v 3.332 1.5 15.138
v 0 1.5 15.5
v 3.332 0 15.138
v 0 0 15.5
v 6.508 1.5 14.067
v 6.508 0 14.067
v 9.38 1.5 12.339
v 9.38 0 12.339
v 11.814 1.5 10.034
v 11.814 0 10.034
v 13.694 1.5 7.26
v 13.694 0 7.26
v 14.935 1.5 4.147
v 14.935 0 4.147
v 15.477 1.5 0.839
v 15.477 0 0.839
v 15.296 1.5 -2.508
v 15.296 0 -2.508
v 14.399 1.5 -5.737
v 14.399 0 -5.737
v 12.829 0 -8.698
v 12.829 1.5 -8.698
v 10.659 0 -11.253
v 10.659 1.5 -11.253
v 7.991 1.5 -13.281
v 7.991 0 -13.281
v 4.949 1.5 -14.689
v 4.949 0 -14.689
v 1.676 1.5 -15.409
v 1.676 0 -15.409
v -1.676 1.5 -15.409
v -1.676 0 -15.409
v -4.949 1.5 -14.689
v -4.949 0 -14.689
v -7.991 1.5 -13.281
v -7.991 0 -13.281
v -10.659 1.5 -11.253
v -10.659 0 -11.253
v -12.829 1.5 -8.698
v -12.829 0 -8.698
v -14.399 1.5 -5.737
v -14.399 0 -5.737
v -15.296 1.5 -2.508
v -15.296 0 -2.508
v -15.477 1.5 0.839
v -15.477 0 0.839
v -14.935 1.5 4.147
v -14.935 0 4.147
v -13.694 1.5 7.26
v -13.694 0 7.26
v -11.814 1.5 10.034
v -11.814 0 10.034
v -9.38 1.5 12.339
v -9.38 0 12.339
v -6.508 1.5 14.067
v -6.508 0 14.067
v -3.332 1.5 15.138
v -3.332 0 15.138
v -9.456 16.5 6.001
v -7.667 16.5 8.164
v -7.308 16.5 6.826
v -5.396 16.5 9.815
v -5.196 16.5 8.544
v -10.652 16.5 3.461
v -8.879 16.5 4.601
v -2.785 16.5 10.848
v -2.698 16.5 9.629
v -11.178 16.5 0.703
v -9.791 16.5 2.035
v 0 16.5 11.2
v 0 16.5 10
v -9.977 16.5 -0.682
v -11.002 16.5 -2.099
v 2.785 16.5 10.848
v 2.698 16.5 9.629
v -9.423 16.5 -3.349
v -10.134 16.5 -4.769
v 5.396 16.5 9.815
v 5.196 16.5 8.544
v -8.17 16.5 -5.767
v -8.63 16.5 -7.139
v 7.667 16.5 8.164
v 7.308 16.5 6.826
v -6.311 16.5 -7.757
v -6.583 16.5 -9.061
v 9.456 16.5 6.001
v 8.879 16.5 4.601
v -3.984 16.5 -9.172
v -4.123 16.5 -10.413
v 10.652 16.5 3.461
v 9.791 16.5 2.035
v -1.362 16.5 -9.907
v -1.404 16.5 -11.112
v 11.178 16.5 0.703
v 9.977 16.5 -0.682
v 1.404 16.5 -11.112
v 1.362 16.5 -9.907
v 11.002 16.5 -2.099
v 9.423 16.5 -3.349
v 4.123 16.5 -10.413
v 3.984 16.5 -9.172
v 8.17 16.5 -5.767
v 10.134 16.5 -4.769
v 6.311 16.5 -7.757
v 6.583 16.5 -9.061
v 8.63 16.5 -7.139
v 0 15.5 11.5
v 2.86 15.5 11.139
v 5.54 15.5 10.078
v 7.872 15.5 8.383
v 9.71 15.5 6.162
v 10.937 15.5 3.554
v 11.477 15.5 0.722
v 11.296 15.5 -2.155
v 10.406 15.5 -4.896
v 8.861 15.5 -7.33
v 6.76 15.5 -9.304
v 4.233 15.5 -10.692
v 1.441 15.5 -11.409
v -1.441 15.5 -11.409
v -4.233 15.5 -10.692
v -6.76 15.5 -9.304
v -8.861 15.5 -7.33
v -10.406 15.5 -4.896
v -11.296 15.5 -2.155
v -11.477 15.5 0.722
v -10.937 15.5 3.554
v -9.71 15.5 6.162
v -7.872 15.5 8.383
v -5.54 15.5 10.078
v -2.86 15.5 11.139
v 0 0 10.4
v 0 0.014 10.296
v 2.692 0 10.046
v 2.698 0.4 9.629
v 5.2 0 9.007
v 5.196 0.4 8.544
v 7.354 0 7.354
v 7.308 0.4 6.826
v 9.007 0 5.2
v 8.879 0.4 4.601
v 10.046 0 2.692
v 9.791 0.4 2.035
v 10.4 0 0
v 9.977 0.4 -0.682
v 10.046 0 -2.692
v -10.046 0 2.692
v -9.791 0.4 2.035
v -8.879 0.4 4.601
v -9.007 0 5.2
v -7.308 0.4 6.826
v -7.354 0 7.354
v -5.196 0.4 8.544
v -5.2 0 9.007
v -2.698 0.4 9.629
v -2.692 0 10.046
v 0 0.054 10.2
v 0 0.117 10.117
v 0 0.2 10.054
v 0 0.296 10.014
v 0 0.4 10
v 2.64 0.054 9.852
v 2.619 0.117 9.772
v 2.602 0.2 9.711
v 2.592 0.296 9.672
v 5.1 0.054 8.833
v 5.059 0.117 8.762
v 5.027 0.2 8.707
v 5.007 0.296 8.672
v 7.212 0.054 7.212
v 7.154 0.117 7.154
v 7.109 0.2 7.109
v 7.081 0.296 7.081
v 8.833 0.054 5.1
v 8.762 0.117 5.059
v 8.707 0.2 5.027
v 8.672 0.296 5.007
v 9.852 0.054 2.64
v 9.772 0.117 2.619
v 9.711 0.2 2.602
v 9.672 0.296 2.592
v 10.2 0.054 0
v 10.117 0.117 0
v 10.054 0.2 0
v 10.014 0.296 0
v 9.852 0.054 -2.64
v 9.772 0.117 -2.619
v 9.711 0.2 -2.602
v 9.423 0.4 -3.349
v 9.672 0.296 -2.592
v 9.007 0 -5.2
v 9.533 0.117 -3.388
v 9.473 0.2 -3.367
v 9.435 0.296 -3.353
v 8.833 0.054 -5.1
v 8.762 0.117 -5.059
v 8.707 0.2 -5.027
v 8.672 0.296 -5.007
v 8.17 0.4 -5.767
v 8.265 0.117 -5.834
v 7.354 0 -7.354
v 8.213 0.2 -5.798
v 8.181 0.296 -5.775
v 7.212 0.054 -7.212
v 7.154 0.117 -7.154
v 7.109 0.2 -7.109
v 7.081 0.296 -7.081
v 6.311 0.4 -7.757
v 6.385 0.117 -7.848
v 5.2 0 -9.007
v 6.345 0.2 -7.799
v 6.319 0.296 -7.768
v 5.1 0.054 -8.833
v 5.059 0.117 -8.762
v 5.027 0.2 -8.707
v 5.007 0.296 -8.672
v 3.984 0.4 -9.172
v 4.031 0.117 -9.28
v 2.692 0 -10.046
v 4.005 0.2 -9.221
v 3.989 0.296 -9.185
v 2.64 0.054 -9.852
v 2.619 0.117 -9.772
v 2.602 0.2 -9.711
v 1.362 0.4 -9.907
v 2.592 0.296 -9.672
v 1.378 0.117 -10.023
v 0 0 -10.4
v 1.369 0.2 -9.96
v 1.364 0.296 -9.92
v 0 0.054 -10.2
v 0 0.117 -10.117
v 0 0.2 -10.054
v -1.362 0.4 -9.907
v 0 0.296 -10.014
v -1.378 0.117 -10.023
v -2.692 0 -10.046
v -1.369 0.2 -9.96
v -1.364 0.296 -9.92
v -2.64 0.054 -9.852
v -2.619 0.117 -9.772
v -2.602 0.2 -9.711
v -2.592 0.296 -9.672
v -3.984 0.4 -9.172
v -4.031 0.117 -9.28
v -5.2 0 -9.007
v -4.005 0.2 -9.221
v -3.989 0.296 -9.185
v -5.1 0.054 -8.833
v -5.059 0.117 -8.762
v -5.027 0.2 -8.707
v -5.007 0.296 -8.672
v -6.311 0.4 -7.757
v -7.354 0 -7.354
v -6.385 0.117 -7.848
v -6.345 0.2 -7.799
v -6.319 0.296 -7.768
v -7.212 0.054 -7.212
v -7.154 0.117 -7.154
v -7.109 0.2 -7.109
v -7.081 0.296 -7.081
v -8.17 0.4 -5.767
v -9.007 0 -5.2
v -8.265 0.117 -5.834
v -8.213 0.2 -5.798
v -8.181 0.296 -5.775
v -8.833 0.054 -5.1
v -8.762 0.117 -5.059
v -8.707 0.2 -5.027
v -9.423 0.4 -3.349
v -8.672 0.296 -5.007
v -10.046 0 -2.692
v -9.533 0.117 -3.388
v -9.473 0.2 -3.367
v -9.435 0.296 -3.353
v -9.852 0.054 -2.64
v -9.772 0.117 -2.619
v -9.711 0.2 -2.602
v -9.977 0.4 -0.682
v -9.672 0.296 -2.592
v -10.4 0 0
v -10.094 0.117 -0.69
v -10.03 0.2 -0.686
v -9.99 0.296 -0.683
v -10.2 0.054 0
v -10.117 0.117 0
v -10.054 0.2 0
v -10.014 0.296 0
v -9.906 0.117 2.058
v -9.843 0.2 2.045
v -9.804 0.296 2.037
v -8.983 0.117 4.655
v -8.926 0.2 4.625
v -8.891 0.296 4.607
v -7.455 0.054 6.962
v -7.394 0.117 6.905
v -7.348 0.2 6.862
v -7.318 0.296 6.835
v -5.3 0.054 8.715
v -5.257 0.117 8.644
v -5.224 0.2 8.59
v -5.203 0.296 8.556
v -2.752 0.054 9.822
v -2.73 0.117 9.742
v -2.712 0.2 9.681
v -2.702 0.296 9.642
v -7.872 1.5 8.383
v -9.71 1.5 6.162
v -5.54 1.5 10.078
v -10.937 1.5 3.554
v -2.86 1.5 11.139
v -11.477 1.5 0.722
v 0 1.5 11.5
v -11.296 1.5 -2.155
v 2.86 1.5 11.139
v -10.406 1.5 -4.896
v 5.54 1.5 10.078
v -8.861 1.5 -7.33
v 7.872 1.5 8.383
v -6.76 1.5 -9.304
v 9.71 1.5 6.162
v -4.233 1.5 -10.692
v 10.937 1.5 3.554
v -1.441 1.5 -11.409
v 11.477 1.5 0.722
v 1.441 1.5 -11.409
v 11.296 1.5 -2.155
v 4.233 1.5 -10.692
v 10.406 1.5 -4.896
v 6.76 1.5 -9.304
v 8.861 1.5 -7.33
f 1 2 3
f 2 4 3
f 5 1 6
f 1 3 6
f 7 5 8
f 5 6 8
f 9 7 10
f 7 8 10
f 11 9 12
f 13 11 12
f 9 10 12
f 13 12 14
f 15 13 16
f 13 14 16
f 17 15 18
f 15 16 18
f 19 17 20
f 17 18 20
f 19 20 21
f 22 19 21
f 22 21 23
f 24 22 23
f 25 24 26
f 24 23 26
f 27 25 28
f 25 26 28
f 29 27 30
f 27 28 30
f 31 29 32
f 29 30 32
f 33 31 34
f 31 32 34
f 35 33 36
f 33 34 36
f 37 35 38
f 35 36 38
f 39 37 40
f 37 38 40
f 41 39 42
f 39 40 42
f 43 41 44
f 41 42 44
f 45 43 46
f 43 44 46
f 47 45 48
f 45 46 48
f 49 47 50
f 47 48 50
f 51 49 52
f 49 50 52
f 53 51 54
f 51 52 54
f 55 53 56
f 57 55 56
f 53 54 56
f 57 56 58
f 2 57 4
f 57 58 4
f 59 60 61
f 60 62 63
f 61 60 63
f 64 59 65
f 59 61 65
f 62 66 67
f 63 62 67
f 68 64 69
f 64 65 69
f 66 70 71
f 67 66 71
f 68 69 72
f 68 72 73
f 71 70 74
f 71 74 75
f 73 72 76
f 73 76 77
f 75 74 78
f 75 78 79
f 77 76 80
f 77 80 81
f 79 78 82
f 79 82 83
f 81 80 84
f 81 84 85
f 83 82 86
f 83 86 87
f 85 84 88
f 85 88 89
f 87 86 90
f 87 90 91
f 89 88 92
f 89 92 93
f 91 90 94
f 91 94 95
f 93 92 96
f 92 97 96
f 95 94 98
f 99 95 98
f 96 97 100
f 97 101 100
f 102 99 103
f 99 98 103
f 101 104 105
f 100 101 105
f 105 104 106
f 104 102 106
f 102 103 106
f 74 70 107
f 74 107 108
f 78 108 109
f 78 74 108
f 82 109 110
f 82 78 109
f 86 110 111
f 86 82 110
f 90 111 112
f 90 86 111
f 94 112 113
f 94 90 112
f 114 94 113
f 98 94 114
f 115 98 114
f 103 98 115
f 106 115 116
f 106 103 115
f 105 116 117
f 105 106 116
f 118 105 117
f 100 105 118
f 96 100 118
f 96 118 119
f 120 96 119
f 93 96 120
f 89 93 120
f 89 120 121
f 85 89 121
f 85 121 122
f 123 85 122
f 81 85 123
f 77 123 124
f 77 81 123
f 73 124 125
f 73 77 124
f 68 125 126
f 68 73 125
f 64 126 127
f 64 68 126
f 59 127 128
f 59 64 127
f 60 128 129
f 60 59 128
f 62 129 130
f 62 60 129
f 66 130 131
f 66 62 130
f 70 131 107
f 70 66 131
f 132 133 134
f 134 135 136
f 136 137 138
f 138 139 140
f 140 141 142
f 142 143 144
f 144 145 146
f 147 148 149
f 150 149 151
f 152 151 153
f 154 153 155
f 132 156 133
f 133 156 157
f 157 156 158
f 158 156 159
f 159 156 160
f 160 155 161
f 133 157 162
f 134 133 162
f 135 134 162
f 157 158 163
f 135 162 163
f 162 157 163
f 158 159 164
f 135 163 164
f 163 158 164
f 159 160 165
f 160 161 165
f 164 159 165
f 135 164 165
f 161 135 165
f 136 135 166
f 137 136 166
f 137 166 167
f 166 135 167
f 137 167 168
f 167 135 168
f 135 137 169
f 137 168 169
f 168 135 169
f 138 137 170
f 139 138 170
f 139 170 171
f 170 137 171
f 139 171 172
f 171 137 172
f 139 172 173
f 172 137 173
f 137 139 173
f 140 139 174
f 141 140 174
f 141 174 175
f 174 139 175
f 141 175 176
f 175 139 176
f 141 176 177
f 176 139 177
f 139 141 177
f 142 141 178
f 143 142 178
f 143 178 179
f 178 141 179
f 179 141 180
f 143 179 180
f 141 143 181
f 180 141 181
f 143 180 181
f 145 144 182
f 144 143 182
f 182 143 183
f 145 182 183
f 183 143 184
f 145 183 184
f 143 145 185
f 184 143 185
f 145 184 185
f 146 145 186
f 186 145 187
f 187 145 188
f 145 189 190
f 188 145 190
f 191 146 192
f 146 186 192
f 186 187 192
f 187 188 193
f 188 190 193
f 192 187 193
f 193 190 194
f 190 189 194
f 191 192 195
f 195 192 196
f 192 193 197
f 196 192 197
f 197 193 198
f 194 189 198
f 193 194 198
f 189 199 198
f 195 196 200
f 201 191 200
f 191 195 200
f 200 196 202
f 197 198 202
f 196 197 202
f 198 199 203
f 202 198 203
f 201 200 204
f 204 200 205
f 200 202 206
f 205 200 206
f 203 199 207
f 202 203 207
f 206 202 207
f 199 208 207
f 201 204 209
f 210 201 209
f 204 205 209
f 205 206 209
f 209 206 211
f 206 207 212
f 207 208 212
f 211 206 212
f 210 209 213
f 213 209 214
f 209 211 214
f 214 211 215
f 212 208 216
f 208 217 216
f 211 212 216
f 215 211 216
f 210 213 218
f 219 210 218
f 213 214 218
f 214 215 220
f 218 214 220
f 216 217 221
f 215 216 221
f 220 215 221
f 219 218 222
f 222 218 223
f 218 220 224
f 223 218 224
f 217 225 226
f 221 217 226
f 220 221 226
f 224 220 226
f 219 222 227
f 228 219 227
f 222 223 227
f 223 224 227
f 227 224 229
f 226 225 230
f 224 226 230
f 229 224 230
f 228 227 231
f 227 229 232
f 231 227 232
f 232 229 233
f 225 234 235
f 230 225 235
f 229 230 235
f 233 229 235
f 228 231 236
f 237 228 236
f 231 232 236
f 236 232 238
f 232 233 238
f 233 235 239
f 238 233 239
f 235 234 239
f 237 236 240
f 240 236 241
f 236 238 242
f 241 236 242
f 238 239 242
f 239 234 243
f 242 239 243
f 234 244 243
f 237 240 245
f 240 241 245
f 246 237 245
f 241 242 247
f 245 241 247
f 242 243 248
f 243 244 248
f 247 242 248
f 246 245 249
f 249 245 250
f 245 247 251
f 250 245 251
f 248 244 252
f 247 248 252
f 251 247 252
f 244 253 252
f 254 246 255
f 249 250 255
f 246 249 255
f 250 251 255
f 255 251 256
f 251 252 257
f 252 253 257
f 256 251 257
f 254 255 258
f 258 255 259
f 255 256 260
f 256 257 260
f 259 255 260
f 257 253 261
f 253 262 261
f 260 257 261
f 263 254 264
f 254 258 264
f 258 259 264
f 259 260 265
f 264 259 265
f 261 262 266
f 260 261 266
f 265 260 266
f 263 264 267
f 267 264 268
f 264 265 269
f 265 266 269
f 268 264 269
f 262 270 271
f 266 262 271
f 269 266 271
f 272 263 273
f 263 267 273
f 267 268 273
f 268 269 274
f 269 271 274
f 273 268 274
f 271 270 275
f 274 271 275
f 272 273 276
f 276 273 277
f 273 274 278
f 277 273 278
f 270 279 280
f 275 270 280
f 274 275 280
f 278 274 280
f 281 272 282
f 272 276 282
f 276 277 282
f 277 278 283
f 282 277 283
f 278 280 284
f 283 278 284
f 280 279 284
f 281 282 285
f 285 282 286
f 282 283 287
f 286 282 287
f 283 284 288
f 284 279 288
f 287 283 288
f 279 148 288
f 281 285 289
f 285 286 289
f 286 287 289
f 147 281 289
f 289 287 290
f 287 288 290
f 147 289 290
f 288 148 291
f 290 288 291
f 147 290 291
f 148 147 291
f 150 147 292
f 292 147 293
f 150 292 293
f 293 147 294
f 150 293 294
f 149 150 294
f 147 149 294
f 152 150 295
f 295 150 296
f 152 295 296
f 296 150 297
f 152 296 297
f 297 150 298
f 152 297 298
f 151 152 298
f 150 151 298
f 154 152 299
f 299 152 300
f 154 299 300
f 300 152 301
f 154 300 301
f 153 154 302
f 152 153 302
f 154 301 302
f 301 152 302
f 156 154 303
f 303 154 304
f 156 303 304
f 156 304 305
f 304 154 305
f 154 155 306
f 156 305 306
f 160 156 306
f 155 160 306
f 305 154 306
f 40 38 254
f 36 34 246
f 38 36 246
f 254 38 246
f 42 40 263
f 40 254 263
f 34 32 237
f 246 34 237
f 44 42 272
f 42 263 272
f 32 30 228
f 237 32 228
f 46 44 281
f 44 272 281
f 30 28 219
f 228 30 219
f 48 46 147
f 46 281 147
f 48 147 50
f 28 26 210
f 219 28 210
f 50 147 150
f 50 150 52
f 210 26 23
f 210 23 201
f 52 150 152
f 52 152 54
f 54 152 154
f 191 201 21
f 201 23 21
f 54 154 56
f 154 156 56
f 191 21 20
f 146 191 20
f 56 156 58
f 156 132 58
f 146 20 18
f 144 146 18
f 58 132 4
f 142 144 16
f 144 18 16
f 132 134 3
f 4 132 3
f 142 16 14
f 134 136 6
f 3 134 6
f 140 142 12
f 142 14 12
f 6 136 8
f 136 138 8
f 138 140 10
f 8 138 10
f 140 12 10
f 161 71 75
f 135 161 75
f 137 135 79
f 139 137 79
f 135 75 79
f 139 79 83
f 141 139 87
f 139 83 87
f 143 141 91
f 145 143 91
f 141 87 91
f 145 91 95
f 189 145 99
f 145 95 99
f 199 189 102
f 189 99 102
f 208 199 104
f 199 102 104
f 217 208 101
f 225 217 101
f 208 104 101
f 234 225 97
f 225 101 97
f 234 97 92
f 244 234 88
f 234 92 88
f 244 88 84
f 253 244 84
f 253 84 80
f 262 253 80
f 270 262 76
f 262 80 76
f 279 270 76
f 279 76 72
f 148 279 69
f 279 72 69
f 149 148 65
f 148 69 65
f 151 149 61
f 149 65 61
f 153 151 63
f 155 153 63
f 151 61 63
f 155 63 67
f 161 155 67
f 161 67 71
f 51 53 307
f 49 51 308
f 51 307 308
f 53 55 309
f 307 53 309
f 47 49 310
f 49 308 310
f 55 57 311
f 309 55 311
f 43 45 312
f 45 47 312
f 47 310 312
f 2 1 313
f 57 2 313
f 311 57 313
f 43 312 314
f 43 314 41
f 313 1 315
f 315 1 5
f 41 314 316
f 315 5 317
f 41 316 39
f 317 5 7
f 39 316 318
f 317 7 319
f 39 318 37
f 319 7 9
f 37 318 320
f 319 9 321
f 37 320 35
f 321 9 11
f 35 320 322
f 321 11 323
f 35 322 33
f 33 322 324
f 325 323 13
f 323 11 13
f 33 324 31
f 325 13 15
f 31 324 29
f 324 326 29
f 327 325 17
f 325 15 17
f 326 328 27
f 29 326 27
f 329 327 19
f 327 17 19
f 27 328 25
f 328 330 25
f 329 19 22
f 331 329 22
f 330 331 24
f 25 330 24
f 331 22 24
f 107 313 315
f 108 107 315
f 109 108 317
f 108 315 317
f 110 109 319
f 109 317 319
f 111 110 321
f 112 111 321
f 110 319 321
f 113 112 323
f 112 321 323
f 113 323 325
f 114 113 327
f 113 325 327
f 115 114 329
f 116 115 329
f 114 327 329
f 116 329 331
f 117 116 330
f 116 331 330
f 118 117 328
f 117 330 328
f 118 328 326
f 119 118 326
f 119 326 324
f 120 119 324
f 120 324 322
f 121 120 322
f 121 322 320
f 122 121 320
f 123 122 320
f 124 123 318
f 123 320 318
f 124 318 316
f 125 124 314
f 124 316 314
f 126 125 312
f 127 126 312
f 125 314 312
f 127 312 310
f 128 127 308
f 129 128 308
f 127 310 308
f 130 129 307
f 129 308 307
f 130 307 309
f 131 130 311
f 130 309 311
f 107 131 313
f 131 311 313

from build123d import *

# Parameters (mm, degrees)
F2_R     = 0.4
F3_SIZE2 = 0.3
F3_SIZE  = 1


with BuildPart() as f1:
    # F0 (on Right) → F1 (revolve)
    with BuildSketch(Plane.YZ):
        Polygon((1.5, 15.5), (0, 15.5), (0, 10), (16.5, 10), (16.5, 11.5), (1.5, 11.5), align=None)
    revolve(axis=Axis((0, 9.5578194596, 0), (0, 1, 0)))

    # F2
    f2_edges = [f1.edges().sort_by_distance(p)[0] for p in [
        (0, 0, -10),
    ]]
    fillet(f2_edges, radius=F2_R)

    # F3
    f3_edges = [f1.edges().sort_by_distance(p)[0] for p in [
        (0, 16.5, -11.5),
    ]]
    f3_side = f1.faces().sort_by_distance((0, 9, -11.5))[0]
    chamfer(f3_edges, length=F3_SIZE, length2=F3_SIZE2, reference=f3_side)


solid = f1.part
